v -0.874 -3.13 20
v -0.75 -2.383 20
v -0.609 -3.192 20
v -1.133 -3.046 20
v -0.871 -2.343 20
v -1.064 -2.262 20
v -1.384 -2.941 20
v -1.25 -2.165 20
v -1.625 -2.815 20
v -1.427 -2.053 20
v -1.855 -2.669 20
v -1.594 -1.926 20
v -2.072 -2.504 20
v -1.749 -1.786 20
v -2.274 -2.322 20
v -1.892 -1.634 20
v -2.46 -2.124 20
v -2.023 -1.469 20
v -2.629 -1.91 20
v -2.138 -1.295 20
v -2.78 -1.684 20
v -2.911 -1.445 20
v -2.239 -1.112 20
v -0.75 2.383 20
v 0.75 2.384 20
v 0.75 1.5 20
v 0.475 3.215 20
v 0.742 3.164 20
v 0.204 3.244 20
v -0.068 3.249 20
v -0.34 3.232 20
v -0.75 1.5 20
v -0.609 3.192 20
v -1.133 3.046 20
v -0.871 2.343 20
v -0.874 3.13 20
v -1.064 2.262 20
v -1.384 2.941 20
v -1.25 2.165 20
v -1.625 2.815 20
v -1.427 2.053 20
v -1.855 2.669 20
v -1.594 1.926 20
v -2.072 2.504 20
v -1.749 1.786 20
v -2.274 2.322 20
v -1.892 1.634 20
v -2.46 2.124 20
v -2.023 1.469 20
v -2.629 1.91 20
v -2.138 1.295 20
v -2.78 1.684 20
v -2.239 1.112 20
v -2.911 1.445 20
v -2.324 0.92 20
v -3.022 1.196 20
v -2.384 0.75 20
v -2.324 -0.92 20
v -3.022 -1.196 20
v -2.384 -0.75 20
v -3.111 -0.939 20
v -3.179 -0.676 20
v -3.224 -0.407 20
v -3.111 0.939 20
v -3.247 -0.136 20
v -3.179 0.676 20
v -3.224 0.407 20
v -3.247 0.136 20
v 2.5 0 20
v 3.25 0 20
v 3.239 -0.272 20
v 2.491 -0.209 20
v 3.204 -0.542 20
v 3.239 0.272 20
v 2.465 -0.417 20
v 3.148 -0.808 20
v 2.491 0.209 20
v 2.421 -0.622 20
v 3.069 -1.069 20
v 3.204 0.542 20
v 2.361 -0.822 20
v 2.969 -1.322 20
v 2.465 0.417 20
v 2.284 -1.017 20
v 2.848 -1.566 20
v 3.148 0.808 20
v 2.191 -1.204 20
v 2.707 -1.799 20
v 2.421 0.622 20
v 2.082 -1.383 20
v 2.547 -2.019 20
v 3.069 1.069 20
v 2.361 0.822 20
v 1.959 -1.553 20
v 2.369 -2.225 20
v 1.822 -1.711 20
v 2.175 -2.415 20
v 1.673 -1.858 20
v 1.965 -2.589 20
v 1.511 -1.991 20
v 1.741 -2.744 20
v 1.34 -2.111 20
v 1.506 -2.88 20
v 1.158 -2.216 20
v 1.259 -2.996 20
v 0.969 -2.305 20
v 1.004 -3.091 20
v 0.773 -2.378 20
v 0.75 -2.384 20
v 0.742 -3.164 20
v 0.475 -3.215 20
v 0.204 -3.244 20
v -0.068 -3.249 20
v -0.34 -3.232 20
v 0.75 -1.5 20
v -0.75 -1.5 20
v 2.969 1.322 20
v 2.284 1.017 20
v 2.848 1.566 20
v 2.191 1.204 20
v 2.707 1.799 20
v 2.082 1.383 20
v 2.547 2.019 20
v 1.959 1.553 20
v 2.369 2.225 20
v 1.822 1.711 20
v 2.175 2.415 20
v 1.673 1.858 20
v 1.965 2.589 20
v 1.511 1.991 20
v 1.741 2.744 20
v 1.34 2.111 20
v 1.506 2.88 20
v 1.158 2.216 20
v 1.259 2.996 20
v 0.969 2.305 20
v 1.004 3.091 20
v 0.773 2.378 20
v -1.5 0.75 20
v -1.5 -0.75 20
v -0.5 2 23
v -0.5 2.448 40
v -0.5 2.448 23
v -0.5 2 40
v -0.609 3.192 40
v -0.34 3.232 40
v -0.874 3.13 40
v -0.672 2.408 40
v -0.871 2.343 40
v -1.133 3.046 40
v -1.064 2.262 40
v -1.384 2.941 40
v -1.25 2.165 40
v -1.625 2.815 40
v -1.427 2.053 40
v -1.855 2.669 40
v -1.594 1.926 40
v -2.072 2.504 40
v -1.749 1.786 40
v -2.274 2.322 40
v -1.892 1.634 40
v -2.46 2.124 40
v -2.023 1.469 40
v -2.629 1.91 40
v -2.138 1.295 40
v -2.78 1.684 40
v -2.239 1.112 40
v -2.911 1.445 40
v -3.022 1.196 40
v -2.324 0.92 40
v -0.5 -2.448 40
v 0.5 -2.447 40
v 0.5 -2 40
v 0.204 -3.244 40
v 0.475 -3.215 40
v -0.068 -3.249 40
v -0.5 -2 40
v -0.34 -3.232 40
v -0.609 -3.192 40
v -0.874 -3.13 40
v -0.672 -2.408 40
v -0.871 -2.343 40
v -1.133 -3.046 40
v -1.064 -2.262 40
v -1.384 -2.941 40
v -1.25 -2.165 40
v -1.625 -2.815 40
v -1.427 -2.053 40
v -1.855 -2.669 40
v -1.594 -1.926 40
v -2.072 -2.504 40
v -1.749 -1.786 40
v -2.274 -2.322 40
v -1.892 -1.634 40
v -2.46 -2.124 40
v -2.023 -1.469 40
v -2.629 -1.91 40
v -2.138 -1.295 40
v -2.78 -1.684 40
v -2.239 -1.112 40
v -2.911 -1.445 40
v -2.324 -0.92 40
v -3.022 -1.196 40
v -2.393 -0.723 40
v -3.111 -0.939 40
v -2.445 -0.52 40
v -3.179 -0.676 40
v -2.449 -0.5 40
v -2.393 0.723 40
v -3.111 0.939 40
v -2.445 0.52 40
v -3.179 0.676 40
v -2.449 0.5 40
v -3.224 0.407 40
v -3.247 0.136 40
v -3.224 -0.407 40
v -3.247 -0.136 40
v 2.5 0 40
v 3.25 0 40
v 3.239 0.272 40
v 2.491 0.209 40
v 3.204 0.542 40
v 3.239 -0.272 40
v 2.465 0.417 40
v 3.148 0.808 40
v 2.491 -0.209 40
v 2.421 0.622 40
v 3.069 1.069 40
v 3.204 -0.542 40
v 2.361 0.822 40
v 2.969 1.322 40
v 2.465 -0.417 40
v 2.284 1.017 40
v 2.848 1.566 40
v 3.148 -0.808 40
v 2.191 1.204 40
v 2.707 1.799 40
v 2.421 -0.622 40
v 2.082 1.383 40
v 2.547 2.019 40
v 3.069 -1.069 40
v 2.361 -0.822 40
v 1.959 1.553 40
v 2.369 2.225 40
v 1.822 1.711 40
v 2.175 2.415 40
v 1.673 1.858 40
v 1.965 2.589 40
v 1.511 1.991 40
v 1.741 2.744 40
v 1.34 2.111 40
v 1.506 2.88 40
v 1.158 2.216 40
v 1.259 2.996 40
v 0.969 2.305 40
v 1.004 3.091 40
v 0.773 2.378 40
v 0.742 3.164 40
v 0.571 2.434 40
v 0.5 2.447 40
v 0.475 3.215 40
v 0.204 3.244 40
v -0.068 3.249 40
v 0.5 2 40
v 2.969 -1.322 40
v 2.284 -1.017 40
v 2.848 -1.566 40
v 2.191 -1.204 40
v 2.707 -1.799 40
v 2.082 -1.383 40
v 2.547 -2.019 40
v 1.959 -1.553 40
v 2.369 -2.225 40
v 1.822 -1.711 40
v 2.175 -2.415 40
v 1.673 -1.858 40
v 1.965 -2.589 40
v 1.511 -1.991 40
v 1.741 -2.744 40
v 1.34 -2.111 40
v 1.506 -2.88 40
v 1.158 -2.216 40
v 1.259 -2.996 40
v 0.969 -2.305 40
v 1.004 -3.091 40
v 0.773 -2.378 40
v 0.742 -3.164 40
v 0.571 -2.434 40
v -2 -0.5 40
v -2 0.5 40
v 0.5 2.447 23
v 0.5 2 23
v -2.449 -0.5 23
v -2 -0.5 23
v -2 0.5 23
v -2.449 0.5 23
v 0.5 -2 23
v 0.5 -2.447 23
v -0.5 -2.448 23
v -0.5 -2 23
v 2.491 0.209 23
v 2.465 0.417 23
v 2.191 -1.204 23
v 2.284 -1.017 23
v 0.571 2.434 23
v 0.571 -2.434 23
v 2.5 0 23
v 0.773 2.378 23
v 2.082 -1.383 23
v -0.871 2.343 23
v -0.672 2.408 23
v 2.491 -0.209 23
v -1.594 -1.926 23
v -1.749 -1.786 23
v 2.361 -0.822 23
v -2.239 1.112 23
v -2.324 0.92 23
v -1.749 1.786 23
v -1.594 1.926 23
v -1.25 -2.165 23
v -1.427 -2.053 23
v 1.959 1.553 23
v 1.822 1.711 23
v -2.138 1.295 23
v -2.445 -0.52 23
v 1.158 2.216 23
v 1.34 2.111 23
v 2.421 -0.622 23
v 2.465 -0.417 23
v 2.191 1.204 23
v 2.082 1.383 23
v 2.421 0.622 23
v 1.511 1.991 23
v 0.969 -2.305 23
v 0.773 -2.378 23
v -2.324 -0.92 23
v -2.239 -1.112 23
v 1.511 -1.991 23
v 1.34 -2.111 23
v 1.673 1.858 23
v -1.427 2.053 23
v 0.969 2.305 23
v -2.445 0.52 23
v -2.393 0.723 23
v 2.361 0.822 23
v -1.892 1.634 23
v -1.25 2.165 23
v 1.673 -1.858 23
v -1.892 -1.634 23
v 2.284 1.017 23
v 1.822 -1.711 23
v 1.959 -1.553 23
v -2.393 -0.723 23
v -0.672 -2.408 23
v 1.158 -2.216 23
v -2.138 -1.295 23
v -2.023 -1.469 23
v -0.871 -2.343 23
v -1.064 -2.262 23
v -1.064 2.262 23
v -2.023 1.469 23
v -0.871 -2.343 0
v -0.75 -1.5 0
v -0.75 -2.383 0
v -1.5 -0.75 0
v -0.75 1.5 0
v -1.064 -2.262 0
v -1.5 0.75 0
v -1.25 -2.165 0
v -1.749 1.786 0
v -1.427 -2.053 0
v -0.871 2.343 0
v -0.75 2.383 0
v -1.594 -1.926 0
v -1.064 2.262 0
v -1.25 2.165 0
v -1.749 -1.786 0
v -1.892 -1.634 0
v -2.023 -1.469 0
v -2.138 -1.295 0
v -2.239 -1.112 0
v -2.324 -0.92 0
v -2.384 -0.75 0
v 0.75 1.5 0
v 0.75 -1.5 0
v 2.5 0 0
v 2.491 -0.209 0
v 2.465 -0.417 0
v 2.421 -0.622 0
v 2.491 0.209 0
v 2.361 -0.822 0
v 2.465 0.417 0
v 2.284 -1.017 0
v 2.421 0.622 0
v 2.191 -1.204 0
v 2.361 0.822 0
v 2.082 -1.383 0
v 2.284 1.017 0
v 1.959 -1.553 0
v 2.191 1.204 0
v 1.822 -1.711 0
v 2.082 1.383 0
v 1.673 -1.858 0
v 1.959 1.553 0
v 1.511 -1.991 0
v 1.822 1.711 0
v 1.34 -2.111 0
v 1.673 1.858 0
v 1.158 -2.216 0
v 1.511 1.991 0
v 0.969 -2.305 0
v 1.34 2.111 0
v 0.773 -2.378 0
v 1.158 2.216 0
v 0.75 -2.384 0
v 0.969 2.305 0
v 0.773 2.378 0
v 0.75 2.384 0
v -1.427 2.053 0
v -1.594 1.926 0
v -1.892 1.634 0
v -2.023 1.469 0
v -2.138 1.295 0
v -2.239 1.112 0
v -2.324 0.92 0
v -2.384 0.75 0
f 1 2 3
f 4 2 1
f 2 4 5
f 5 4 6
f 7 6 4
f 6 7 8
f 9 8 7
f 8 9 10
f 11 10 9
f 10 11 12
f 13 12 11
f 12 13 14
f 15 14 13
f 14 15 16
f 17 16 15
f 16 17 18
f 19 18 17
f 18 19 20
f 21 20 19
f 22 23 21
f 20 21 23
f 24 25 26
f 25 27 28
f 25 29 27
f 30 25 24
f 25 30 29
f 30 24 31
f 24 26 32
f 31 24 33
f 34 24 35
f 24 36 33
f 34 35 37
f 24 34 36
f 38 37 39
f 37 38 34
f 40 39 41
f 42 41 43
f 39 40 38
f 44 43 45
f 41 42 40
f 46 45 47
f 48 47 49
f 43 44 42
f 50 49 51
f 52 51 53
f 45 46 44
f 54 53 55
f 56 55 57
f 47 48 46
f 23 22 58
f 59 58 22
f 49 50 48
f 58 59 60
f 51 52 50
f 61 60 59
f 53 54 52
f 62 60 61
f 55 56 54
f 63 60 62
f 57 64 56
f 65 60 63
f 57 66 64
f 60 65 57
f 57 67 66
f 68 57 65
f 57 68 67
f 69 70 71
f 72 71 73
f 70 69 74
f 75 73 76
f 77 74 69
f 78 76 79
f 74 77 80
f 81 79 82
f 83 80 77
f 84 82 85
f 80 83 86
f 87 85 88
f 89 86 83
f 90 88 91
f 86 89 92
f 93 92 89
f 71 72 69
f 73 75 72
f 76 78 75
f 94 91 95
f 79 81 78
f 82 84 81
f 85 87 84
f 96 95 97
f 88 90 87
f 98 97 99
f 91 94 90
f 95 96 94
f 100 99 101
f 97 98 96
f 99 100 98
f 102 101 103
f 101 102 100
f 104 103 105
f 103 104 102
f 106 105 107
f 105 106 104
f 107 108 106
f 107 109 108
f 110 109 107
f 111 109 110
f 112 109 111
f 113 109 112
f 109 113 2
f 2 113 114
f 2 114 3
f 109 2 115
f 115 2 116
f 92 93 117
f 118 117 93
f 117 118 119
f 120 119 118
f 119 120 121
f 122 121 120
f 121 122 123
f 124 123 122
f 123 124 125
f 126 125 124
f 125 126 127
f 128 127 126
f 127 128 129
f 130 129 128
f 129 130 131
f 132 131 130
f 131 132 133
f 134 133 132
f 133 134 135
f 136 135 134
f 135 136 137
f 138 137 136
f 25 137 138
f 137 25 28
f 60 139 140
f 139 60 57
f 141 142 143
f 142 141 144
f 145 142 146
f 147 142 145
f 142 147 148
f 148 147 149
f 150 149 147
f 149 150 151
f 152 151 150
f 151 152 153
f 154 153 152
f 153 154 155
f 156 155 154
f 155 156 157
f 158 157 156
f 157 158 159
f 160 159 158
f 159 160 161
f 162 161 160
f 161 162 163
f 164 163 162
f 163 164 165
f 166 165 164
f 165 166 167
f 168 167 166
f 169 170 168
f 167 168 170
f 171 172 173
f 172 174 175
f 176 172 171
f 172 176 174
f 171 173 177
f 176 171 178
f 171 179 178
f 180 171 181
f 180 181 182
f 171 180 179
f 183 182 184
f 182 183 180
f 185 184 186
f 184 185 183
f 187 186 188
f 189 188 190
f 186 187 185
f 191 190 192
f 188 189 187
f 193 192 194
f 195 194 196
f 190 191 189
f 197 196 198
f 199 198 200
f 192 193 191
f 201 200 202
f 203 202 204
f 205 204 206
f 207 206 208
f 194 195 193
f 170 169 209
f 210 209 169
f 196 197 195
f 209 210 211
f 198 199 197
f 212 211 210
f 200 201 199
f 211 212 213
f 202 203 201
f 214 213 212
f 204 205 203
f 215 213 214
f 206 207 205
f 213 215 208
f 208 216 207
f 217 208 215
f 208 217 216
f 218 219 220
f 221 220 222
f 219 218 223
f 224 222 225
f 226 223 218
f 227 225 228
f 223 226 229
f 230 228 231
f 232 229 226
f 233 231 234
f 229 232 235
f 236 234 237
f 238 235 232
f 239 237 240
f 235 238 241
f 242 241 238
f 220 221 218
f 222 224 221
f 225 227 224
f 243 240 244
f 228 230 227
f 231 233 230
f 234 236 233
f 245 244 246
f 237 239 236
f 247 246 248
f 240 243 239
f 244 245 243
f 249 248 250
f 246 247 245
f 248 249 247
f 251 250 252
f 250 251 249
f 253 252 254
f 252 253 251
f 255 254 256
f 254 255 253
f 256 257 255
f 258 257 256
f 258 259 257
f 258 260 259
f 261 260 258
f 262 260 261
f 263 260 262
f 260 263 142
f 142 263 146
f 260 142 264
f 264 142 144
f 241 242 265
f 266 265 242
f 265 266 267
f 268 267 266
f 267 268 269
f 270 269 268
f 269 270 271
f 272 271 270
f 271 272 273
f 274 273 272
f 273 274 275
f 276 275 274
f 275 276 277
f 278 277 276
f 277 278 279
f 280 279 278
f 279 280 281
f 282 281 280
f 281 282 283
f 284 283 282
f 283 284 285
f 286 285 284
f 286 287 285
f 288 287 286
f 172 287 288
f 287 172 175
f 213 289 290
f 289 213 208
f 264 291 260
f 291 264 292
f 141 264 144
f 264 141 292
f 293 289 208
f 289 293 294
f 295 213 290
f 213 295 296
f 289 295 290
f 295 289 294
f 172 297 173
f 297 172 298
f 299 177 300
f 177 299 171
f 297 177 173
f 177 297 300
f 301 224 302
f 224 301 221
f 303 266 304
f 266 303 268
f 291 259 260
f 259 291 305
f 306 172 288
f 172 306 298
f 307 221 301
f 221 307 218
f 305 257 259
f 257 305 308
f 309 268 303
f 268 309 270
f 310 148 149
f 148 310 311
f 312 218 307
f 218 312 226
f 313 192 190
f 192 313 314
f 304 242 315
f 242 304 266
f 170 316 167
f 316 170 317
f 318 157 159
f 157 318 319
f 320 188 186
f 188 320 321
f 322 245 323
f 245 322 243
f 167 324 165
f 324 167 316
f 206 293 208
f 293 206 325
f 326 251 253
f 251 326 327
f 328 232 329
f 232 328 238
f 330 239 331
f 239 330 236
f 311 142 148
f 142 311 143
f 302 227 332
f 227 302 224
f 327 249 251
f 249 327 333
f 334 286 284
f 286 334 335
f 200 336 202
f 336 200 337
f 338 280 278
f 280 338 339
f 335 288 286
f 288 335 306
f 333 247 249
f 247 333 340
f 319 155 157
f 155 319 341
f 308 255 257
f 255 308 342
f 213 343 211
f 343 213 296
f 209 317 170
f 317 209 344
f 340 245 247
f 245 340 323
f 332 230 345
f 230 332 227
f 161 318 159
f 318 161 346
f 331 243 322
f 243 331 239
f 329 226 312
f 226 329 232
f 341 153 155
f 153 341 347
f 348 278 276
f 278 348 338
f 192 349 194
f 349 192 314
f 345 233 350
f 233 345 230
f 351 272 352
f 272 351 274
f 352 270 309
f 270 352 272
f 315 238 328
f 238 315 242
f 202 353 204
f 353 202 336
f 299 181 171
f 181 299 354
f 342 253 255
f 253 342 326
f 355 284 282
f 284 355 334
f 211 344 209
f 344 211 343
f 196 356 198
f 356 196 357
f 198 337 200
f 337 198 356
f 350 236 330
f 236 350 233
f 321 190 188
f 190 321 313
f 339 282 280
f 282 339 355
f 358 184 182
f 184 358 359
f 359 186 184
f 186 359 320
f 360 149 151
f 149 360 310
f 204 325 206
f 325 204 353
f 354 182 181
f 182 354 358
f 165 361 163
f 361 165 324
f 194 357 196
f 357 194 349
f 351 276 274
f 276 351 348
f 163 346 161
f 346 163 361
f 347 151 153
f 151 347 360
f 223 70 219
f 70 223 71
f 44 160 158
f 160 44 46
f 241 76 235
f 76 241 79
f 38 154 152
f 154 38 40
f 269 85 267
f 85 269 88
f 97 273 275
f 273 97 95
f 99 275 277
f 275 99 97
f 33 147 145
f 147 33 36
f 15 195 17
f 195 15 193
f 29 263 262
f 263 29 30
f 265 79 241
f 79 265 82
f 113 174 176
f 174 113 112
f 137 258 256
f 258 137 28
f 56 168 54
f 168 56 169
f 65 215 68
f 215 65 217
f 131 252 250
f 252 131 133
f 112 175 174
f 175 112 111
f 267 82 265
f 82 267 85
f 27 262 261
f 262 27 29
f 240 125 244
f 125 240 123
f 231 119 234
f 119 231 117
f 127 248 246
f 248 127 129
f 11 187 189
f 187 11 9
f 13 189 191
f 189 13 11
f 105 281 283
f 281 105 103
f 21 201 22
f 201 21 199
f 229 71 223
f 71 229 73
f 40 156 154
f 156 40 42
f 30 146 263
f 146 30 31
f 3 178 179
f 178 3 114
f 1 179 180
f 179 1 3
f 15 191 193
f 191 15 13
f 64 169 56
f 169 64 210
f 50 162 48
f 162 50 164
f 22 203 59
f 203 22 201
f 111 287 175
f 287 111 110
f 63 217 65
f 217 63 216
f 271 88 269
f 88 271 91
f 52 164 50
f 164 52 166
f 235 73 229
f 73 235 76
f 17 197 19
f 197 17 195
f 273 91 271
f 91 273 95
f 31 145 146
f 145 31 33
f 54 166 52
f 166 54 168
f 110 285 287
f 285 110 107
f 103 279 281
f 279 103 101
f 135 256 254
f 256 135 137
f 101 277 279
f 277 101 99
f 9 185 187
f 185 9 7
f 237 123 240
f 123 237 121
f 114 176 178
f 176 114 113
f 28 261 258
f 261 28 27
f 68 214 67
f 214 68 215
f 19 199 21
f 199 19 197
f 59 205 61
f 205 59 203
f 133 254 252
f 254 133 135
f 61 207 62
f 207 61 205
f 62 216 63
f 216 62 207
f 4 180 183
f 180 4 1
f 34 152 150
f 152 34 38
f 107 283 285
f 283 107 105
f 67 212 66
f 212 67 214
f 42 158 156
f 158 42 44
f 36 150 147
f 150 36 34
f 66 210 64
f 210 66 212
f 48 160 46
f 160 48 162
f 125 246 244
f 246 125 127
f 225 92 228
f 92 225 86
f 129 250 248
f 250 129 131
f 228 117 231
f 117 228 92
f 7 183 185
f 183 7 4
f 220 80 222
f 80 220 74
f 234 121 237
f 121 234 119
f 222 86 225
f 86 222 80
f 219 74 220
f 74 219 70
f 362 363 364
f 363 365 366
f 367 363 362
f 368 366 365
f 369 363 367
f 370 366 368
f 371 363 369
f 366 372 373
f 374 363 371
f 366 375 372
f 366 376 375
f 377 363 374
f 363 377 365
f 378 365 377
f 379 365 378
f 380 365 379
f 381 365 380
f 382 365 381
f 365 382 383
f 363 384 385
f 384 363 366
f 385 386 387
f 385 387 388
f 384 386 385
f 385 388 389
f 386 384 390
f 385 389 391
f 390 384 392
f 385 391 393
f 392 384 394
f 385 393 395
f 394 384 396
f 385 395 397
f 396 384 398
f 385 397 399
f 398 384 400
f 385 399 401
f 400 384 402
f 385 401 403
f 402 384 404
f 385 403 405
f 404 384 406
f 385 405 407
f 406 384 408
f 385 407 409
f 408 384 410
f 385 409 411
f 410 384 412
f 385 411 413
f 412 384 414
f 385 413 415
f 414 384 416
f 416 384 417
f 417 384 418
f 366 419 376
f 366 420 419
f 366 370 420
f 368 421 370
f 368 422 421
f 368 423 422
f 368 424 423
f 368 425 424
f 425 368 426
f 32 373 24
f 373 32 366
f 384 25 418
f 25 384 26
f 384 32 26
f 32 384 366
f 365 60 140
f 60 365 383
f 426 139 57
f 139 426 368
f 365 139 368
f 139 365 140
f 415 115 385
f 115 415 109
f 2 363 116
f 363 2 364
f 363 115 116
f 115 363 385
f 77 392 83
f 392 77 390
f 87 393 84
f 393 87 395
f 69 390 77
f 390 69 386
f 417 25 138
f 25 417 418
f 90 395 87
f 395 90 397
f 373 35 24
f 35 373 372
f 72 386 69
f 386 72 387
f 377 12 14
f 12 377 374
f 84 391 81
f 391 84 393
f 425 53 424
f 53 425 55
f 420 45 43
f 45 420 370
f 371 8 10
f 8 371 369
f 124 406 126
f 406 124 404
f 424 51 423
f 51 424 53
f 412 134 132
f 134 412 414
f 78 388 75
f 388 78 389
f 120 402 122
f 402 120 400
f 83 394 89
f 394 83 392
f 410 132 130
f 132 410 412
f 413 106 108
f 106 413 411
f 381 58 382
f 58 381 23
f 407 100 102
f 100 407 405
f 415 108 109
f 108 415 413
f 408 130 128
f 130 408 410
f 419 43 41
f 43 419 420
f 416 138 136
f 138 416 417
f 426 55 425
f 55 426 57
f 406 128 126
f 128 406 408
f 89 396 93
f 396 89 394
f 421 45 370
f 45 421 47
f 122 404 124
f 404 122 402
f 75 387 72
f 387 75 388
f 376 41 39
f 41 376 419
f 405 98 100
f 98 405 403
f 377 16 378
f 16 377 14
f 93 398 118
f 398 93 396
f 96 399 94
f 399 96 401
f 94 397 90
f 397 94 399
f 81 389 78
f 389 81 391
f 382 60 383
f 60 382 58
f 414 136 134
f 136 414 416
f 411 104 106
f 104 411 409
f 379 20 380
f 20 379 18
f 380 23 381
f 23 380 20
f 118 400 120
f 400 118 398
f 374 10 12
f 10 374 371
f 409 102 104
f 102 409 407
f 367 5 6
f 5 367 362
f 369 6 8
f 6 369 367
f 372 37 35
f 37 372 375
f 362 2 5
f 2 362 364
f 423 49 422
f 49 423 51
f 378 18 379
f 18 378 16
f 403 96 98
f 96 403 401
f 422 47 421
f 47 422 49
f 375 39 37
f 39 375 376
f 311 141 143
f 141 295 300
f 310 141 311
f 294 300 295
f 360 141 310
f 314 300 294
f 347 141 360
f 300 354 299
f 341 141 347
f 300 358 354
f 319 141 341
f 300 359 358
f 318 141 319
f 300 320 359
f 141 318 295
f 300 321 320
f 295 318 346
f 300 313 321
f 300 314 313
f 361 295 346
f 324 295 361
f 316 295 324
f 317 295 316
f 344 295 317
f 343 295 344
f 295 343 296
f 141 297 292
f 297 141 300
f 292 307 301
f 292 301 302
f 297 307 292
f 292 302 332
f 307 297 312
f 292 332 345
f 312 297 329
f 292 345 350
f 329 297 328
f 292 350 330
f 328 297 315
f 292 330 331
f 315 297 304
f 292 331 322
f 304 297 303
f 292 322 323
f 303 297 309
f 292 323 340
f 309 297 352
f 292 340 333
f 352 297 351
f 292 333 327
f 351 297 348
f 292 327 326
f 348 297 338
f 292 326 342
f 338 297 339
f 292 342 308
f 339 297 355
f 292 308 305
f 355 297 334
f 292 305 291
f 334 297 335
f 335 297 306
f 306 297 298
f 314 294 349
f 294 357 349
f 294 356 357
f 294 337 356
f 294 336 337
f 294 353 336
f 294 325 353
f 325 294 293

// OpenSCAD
$fn = 75;

cyl_d = 5;
cyl_height = 20;
slit_size_inside = [1.5, 1];

slit_size_outside = [1, 0.5];
cyl_outside_d = 6.5;
cyl_join_height = 3;

module stick_inside(slit_size) {
    difference() {
        linear_extrude(height=cyl_height)
        circle(cyl_d/2);
        for(i = [0:2]) {
            echo(i);
            rotate([0, 0, 90*i])
            linear_extrude(height=cyl_height)
            translate([-slit_size.x/2, cyl_d/2 - slit_size.y])
            square([slit_size.x, slit_size.y]);
        }
    }
}

module stick_outside(slit_size, height) {
   difference() {
        linear_extrude(height=height)
        circle(cyl_outside_d/2);
        stick_inside(slit_size);
    }  
}

translate([0, 0, cyl_height])
linear_extrude(height=cyl_join_height)
circle(cyl_outside_d/2);
        
translate([0, 0, cyl_height])
stick_outside(slit_size_outside, cyl_height);

stick_inside(slit_size_inside);
